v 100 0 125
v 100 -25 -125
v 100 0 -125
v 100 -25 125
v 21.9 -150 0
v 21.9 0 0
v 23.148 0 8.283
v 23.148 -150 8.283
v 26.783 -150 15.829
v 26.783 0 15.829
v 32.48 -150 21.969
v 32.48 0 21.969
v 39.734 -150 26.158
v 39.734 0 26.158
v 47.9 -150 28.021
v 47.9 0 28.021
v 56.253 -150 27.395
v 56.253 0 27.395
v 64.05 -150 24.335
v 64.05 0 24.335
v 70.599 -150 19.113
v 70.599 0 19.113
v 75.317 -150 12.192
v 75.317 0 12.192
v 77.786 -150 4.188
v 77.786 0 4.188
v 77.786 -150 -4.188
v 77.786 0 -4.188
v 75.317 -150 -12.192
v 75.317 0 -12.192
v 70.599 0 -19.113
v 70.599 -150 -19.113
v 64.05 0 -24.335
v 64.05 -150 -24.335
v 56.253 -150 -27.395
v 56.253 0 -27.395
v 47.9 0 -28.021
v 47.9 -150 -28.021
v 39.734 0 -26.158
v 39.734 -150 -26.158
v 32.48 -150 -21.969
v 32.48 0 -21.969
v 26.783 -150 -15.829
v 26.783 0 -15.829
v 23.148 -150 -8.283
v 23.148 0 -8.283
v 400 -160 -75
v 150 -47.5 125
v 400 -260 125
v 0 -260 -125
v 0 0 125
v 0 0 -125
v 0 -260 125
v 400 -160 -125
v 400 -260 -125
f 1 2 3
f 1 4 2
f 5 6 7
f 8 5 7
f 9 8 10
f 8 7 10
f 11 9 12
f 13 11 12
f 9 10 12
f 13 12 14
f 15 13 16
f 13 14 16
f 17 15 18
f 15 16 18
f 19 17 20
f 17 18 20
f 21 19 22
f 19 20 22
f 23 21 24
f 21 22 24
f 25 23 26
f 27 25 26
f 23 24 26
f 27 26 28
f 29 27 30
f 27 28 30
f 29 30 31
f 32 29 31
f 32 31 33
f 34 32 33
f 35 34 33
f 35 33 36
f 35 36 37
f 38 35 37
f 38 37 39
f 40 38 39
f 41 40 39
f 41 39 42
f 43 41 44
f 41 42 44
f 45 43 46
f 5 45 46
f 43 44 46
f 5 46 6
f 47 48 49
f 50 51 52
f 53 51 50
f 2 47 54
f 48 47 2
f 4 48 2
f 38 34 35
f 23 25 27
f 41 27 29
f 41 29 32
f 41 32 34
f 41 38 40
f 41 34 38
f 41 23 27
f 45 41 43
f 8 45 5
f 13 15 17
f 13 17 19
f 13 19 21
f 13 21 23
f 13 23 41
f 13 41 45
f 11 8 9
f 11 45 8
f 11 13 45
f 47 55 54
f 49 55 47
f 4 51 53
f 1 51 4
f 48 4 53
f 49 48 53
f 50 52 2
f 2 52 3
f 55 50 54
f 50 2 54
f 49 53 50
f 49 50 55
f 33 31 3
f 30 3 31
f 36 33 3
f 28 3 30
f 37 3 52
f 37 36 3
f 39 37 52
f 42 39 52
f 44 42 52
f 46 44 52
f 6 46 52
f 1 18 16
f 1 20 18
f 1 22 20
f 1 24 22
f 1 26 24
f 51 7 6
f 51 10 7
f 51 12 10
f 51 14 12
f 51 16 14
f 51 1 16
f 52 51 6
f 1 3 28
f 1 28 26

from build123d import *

# Parameters (mm, degrees)
BOSS_EXTRUDE1_DEPTH = 125
CUT_EXTRUDE1_DEPTH  = 250
SKETCH2_R           = 28.1
CUT_EXTRUDE2_DEPTH  = 150


with BuildPart() as part:
    # Sketch1 → Boss-Extrude1 (new, symmetric)
    with BuildSketch(Plane.XY):
        Polygon((0, 0), (0, -260), (400, -260), (400, -160), (100, -25), (100, 0), align=None)
    extrude(amount=BOSS_EXTRUDE1_DEPTH, both=True)

    # 3DSketch1 → Cut-Extrude1 (cut, along a direction that is not the sketch's normal)
    with BuildSketch(Plane(origin=(150, -47.5, 125), x_dir=(0.7367094686837573, -0.3315192609076908, -0.5893675749470058), z_dir=(-0.6052160263325688, -0.7120188545089043, -0.3560094272544522))):
        Polygon((0, 0), (339.346799012, 0), (254.625210114, 206.935382123), align=None)
    extrude(amount=-CUT_EXTRUDE1_DEPTH, dir=(0, -1, 0), mode=Mode.SUBTRACT)

    # Sketch2 → Cut-Extrude2 (cut)
    with BuildSketch(Plane(origin=(0, 0, 0), x_dir=(1, 0, 0), z_dir=(0, 1, 0))):
        with Locations(Location((50, 0, 0), (0, 0, 180))):
            Circle(SKETCH2_R)
    extrude(amount=-CUT_EXTRUDE2_DEPTH, mode=Mode.SUBTRACT)


solid = part.part
